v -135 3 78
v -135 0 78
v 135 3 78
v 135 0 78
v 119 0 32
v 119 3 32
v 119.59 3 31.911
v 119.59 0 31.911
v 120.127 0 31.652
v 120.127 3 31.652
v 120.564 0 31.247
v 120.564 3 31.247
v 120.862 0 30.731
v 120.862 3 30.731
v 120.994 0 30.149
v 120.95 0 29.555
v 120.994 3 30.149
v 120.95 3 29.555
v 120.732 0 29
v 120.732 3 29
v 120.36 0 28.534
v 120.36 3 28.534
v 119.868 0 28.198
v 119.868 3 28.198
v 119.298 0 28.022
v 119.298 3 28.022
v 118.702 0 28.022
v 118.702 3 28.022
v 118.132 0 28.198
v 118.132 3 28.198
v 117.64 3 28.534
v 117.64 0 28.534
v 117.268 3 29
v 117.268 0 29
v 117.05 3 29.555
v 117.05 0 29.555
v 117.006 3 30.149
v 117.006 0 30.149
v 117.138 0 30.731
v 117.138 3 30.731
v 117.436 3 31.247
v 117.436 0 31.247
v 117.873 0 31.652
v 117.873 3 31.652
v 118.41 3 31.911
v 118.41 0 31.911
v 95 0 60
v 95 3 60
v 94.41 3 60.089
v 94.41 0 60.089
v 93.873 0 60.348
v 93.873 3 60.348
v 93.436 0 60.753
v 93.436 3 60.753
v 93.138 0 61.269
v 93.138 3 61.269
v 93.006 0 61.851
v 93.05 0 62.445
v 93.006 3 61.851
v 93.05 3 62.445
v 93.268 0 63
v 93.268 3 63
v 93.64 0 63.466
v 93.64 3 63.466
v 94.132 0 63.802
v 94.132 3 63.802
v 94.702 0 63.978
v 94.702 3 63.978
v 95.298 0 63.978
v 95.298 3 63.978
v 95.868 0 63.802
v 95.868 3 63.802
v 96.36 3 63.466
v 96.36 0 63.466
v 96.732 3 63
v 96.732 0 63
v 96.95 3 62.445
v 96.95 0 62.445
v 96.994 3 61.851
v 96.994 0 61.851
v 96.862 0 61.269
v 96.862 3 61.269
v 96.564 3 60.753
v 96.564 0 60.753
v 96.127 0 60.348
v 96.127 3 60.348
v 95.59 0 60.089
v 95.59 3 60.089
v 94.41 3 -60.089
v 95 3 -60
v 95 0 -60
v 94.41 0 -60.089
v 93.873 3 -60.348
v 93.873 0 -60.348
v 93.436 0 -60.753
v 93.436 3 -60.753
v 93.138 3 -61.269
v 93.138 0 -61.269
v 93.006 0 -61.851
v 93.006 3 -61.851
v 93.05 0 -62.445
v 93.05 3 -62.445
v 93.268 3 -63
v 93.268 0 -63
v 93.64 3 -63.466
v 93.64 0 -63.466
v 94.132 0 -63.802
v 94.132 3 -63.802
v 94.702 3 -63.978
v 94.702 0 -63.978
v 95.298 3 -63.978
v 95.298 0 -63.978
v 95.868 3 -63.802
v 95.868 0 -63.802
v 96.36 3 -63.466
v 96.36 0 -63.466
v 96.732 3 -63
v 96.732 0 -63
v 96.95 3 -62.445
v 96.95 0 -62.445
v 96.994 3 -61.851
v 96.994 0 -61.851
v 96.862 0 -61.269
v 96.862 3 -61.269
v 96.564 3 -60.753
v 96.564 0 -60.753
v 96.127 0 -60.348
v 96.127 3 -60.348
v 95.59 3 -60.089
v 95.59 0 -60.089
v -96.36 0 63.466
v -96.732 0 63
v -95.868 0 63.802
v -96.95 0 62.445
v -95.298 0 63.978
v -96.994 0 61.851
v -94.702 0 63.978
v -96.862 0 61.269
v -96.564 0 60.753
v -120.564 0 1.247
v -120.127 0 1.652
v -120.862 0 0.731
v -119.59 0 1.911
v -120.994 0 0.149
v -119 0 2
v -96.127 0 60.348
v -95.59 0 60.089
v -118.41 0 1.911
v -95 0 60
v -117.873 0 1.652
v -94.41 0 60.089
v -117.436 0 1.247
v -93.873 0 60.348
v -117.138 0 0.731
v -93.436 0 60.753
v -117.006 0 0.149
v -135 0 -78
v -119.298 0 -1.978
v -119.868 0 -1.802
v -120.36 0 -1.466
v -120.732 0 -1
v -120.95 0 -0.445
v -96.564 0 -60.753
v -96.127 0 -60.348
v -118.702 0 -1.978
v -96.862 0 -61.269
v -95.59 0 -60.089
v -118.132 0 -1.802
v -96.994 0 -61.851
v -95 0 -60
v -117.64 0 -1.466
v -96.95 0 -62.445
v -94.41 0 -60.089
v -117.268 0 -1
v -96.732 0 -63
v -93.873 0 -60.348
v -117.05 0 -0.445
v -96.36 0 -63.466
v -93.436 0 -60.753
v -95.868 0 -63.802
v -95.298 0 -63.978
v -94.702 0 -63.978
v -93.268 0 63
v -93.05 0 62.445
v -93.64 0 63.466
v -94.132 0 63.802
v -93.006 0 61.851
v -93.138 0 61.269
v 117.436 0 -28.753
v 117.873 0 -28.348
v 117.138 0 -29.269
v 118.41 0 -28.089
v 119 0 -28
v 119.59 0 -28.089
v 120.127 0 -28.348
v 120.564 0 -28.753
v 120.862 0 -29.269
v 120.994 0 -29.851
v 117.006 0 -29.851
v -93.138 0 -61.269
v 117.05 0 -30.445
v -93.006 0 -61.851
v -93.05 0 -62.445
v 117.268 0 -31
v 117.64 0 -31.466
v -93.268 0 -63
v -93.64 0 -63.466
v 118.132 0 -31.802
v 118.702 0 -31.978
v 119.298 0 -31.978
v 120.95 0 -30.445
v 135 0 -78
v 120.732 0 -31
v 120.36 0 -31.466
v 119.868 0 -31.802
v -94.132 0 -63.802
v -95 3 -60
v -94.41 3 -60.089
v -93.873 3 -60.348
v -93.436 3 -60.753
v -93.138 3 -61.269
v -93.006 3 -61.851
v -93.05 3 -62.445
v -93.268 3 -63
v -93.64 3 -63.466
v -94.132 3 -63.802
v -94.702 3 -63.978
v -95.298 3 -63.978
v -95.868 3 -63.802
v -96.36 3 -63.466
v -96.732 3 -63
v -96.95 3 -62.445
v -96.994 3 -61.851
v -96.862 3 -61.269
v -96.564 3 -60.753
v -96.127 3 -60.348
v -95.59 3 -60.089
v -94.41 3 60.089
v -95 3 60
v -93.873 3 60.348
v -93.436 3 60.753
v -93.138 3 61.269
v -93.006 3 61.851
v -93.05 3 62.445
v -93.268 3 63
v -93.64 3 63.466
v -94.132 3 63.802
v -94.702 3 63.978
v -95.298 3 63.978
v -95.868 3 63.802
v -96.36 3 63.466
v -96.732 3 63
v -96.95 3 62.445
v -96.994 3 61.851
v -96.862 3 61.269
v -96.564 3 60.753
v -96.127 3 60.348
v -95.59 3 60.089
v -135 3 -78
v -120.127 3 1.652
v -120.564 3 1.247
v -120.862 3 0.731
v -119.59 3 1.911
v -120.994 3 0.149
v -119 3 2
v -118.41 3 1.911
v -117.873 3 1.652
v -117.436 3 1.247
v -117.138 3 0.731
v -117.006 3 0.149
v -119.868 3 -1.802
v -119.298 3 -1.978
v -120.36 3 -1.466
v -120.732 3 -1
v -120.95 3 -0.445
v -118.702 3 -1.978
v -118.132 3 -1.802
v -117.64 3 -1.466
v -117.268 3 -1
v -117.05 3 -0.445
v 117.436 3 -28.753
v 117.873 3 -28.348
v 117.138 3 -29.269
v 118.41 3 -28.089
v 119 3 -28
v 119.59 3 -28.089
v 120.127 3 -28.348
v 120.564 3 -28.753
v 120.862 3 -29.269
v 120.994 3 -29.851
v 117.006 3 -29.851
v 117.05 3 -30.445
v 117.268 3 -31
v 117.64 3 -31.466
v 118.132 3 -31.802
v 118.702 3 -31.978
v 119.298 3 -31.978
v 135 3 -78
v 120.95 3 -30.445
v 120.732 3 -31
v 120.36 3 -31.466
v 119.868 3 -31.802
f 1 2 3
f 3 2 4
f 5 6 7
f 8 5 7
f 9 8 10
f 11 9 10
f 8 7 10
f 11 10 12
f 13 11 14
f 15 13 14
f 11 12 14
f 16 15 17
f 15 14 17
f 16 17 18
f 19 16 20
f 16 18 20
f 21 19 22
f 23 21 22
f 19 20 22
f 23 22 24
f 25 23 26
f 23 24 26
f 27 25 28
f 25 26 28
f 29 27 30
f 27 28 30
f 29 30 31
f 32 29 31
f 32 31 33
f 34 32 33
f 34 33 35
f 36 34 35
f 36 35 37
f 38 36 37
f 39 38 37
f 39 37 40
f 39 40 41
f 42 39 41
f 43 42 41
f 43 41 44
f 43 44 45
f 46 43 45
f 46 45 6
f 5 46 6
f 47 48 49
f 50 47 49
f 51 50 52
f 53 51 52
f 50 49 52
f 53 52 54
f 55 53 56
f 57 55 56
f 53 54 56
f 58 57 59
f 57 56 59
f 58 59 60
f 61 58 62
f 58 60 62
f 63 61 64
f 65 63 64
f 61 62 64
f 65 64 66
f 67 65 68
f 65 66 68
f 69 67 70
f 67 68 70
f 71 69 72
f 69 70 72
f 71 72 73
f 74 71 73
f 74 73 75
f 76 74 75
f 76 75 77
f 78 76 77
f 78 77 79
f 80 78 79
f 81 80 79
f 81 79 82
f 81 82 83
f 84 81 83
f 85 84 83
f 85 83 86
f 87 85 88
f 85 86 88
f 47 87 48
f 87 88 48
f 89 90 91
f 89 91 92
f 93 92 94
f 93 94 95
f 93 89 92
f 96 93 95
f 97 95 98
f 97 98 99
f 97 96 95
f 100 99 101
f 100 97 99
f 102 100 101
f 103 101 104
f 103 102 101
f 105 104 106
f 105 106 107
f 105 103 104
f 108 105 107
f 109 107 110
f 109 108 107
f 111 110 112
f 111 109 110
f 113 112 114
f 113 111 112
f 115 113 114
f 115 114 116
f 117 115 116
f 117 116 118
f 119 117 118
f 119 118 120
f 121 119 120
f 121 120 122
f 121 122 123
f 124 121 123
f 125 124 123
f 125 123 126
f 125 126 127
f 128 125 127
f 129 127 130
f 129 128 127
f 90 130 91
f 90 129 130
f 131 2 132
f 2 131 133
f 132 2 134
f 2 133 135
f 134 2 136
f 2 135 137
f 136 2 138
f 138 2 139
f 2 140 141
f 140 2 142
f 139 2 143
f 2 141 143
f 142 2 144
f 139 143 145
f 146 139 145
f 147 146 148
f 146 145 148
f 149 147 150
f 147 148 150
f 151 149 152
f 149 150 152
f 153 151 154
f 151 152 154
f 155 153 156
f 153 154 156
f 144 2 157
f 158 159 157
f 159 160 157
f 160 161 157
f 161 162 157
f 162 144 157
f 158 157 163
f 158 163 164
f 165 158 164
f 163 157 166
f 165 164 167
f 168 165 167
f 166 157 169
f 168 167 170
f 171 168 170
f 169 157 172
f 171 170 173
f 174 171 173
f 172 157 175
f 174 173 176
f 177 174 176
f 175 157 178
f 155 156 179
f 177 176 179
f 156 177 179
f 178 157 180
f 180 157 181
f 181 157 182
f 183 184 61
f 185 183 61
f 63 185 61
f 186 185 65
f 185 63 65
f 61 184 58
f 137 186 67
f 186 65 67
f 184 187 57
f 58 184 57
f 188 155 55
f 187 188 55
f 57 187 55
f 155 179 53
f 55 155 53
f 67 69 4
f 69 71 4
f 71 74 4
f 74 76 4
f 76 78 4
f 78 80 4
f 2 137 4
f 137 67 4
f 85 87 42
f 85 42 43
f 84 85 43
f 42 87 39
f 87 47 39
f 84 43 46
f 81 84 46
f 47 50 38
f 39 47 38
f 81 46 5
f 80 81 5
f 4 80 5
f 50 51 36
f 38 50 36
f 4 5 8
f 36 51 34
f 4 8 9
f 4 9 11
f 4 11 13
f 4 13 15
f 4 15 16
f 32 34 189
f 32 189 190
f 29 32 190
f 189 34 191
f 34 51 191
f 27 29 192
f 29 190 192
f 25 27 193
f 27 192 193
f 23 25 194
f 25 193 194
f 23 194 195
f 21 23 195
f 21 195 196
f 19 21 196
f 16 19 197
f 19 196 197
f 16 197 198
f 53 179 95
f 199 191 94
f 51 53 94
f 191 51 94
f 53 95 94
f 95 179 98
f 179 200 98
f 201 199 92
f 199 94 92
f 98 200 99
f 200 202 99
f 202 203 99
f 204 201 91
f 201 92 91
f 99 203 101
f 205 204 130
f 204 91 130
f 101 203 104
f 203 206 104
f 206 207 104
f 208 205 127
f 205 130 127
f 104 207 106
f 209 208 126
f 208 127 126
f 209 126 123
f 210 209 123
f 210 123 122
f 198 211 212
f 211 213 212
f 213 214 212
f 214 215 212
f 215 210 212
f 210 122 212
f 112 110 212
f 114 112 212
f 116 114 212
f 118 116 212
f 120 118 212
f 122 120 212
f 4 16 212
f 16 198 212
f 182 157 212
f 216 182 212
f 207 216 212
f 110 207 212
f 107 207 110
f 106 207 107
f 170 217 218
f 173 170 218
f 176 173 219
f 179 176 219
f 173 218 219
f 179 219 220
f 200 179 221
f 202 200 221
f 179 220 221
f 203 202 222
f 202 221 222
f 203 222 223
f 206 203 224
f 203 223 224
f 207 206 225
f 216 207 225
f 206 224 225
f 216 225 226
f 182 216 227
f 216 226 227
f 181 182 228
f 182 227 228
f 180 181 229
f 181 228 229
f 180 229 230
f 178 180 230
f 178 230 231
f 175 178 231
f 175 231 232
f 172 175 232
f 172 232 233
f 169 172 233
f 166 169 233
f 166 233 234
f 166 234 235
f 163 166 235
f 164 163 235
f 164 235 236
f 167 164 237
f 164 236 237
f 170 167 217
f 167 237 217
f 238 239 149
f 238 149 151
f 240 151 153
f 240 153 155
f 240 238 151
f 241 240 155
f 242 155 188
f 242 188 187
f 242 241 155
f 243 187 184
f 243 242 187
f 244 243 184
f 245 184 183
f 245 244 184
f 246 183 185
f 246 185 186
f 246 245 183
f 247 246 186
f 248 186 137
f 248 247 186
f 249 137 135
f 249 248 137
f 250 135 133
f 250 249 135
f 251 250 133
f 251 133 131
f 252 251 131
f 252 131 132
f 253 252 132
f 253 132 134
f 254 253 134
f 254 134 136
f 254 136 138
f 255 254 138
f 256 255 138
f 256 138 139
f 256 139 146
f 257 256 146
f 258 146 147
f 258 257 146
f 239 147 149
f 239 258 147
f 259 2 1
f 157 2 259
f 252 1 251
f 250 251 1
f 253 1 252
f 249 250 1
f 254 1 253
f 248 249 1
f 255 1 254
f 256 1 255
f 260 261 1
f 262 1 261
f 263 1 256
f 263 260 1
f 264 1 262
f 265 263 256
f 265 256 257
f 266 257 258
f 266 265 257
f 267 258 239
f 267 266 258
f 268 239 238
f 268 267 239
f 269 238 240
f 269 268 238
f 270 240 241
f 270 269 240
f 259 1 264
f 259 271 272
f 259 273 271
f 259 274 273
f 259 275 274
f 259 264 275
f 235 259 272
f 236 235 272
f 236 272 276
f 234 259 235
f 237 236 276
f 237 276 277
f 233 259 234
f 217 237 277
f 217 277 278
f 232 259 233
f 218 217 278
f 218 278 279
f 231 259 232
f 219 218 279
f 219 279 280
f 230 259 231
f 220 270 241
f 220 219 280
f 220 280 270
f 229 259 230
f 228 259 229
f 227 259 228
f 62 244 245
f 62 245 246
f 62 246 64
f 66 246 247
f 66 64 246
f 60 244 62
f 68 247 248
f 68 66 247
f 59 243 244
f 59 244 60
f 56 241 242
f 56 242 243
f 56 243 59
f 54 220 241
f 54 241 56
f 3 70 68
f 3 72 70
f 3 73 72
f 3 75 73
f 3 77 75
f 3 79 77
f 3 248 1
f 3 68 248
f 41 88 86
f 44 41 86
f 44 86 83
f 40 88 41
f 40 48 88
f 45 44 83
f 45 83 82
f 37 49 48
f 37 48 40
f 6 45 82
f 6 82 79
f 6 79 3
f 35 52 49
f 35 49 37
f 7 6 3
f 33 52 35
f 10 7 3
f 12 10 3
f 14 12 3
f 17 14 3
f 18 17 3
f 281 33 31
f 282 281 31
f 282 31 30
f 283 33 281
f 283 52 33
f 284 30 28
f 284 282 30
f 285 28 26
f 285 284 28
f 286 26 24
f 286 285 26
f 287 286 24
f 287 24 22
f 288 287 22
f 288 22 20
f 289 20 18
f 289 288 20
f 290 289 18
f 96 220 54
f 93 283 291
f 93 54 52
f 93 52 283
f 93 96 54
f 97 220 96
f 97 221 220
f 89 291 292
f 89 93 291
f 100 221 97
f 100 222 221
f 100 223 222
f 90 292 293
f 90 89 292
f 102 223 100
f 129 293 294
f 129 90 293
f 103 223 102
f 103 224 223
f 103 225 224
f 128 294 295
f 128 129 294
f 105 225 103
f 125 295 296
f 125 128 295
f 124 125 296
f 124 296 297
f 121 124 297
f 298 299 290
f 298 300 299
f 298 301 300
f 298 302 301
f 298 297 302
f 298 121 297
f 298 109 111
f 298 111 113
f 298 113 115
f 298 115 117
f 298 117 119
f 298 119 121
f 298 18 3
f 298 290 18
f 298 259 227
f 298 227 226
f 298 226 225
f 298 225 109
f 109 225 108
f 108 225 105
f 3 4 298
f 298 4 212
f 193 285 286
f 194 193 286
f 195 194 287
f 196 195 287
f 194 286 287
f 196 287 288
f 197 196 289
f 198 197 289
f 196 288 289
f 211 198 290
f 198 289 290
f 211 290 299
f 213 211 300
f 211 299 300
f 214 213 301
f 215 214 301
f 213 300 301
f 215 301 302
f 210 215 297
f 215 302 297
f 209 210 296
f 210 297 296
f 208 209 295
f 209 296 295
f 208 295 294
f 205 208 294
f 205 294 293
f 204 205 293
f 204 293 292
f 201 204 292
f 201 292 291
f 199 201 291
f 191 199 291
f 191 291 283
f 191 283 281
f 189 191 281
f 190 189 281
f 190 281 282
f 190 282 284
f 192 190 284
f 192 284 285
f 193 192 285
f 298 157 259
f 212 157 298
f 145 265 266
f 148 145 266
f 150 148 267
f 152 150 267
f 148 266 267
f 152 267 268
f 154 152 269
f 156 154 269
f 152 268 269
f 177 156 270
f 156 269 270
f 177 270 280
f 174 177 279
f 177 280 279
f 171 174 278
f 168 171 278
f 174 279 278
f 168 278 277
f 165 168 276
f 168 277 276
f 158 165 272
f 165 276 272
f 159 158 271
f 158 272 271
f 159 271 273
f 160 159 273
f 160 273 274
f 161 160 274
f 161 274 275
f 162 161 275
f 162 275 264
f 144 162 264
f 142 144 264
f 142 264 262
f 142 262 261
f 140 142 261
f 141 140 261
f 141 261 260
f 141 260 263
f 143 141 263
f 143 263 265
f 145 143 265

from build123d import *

# Parameters (mm, degrees)
SKETCH1_W               = 270
SKETCH1_H               = 156
BOSS_EXTRUDE1_DEPTH     = 3
CUT_EXTRUDE1_REACH      = 5
SKETCH2_R               = 2
SKETCH3_R               = 2
CUT_EXTRUDE2_DEPTH      = 3
MIRROR4_COPY_1_SKETCH_R = 2
MIRROR4_COPY_1_DEPTH    = 3
CUT_EXTRUDE4_REACH      = 5
SKETCH5_R               = 2


with BuildPart() as part:
    # Sketch1 → Boss-Extrude1 (new body)
    with BuildSketch(Plane(origin=(0, 0, 0), x_dir=(1, 0, 0), z_dir=(0, 1, 0))):
        Rectangle(SKETCH1_W, SKETCH1_H)
    extrude(amount=BOSS_EXTRUDE1_DEPTH)

    # Sketch2 → Cut-Extrude1 (cut, up to next)
    with BuildSketch(Plane(origin=(0, 3, 0), x_dir=(1, 0, 0), z_dir=(0, 1, 0)), mode=Mode.PRIVATE) as cut_extrude1_sk1:
        with Locations(Location((-119, 0, 0), (0, 0, 270))):  # turned: the seam where the file's is
            Circle(SKETCH2_R)
    cut_extrude1_tool1 = extrude(cut_extrude1_sk1.sketch, amount=-CUT_EXTRUDE1_REACH, mode=Mode.PRIVATE) & part.part
    add(cut_extrude1_tool1.solids().sort_by_distance((-119, 3, 0))[0], mode=Mode.SUBTRACT)

    # Sketch3 → Cut-Extrude2 (cut)
    with BuildSketch(Plane(origin=(0, 3, 0), x_dir=(1, 0, 0), z_dir=(0, 1, 0))):
        with Locations(Location((-95, 62, 0), (0, 0, 270))):  # turned: the seam where the file's is
            Circle(SKETCH3_R)
    cut_extrude2 = extrude(amount=-CUT_EXTRUDE2_DEPTH, mode=Mode.SUBTRACT)

    # Mirror3: Cut-Extrude2 across plane
    add(cut_extrude2.mirror(Plane(origin=(0, 0, 0), x_dir=(0, 0, 1), z_dir=(1, 0, 0))), mode=Mode.SUBTRACT)

    # Mirror4: Cut-Extrude2 across plane
    add(cut_extrude2.mirror(Plane.XY), mode=Mode.SUBTRACT)

    # Mirror4 copy 1 sketch → Mirror4 copy 1 (cut)
    with BuildSketch(Plane(origin=(0, 3, 0), x_dir=(-1, 0, 0), z_dir=(0, 1, 0))):
        with Locations(Location((-95, 62, 0), (0, 0, 270))):  # turned: the seam where the file's is
            Circle(MIRROR4_COPY_1_SKETCH_R)
    extrude(amount=-MIRROR4_COPY_1_DEPTH, mode=Mode.SUBTRACT)

    # Sketch5 → Cut-Extrude4 (cut, up to next)
    with BuildSketch(Plane(origin=(0, 3, 0), x_dir=(1, 0, 0), z_dir=(0, 1, 0)), mode=Mode.PRIVATE) as cut_extrude4_sk1:
        with Locations(Location((119, 30, 0), (0, 0, 270))):  # turned: the seam where the file's is
            Circle(SKETCH5_R)
    cut_extrude4_tool1 = extrude(cut_extrude4_sk1.sketch, amount=-CUT_EXTRUDE4_REACH, mode=Mode.PRIVATE) & part.part
    add(cut_extrude4_tool1.solids().sort_by_distance((119, 3, -30))[0], mode=Mode.SUBTRACT)
    # Sketch5 → Cut-Extrude4 (cut, up to next)
    with BuildSketch(Plane(origin=(0, 3, 0), x_dir=(1, 0, 0), z_dir=(0, 1, 0)), mode=Mode.PRIVATE) as cut_extrude4_sk2:
        with Locations(Location((119, -30, 0), (0, 0, 270))):  # turned: the seam where the file's is
            Circle(SKETCH5_R)
    cut_extrude4_tool2 = extrude(cut_extrude4_sk2.sketch, amount=-CUT_EXTRUDE4_REACH, mode=Mode.PRIVATE) & part.part
    add(cut_extrude4_tool2.solids().sort_by_distance((119, 3, 30))[0], mode=Mode.SUBTRACT)


solid = part.part
